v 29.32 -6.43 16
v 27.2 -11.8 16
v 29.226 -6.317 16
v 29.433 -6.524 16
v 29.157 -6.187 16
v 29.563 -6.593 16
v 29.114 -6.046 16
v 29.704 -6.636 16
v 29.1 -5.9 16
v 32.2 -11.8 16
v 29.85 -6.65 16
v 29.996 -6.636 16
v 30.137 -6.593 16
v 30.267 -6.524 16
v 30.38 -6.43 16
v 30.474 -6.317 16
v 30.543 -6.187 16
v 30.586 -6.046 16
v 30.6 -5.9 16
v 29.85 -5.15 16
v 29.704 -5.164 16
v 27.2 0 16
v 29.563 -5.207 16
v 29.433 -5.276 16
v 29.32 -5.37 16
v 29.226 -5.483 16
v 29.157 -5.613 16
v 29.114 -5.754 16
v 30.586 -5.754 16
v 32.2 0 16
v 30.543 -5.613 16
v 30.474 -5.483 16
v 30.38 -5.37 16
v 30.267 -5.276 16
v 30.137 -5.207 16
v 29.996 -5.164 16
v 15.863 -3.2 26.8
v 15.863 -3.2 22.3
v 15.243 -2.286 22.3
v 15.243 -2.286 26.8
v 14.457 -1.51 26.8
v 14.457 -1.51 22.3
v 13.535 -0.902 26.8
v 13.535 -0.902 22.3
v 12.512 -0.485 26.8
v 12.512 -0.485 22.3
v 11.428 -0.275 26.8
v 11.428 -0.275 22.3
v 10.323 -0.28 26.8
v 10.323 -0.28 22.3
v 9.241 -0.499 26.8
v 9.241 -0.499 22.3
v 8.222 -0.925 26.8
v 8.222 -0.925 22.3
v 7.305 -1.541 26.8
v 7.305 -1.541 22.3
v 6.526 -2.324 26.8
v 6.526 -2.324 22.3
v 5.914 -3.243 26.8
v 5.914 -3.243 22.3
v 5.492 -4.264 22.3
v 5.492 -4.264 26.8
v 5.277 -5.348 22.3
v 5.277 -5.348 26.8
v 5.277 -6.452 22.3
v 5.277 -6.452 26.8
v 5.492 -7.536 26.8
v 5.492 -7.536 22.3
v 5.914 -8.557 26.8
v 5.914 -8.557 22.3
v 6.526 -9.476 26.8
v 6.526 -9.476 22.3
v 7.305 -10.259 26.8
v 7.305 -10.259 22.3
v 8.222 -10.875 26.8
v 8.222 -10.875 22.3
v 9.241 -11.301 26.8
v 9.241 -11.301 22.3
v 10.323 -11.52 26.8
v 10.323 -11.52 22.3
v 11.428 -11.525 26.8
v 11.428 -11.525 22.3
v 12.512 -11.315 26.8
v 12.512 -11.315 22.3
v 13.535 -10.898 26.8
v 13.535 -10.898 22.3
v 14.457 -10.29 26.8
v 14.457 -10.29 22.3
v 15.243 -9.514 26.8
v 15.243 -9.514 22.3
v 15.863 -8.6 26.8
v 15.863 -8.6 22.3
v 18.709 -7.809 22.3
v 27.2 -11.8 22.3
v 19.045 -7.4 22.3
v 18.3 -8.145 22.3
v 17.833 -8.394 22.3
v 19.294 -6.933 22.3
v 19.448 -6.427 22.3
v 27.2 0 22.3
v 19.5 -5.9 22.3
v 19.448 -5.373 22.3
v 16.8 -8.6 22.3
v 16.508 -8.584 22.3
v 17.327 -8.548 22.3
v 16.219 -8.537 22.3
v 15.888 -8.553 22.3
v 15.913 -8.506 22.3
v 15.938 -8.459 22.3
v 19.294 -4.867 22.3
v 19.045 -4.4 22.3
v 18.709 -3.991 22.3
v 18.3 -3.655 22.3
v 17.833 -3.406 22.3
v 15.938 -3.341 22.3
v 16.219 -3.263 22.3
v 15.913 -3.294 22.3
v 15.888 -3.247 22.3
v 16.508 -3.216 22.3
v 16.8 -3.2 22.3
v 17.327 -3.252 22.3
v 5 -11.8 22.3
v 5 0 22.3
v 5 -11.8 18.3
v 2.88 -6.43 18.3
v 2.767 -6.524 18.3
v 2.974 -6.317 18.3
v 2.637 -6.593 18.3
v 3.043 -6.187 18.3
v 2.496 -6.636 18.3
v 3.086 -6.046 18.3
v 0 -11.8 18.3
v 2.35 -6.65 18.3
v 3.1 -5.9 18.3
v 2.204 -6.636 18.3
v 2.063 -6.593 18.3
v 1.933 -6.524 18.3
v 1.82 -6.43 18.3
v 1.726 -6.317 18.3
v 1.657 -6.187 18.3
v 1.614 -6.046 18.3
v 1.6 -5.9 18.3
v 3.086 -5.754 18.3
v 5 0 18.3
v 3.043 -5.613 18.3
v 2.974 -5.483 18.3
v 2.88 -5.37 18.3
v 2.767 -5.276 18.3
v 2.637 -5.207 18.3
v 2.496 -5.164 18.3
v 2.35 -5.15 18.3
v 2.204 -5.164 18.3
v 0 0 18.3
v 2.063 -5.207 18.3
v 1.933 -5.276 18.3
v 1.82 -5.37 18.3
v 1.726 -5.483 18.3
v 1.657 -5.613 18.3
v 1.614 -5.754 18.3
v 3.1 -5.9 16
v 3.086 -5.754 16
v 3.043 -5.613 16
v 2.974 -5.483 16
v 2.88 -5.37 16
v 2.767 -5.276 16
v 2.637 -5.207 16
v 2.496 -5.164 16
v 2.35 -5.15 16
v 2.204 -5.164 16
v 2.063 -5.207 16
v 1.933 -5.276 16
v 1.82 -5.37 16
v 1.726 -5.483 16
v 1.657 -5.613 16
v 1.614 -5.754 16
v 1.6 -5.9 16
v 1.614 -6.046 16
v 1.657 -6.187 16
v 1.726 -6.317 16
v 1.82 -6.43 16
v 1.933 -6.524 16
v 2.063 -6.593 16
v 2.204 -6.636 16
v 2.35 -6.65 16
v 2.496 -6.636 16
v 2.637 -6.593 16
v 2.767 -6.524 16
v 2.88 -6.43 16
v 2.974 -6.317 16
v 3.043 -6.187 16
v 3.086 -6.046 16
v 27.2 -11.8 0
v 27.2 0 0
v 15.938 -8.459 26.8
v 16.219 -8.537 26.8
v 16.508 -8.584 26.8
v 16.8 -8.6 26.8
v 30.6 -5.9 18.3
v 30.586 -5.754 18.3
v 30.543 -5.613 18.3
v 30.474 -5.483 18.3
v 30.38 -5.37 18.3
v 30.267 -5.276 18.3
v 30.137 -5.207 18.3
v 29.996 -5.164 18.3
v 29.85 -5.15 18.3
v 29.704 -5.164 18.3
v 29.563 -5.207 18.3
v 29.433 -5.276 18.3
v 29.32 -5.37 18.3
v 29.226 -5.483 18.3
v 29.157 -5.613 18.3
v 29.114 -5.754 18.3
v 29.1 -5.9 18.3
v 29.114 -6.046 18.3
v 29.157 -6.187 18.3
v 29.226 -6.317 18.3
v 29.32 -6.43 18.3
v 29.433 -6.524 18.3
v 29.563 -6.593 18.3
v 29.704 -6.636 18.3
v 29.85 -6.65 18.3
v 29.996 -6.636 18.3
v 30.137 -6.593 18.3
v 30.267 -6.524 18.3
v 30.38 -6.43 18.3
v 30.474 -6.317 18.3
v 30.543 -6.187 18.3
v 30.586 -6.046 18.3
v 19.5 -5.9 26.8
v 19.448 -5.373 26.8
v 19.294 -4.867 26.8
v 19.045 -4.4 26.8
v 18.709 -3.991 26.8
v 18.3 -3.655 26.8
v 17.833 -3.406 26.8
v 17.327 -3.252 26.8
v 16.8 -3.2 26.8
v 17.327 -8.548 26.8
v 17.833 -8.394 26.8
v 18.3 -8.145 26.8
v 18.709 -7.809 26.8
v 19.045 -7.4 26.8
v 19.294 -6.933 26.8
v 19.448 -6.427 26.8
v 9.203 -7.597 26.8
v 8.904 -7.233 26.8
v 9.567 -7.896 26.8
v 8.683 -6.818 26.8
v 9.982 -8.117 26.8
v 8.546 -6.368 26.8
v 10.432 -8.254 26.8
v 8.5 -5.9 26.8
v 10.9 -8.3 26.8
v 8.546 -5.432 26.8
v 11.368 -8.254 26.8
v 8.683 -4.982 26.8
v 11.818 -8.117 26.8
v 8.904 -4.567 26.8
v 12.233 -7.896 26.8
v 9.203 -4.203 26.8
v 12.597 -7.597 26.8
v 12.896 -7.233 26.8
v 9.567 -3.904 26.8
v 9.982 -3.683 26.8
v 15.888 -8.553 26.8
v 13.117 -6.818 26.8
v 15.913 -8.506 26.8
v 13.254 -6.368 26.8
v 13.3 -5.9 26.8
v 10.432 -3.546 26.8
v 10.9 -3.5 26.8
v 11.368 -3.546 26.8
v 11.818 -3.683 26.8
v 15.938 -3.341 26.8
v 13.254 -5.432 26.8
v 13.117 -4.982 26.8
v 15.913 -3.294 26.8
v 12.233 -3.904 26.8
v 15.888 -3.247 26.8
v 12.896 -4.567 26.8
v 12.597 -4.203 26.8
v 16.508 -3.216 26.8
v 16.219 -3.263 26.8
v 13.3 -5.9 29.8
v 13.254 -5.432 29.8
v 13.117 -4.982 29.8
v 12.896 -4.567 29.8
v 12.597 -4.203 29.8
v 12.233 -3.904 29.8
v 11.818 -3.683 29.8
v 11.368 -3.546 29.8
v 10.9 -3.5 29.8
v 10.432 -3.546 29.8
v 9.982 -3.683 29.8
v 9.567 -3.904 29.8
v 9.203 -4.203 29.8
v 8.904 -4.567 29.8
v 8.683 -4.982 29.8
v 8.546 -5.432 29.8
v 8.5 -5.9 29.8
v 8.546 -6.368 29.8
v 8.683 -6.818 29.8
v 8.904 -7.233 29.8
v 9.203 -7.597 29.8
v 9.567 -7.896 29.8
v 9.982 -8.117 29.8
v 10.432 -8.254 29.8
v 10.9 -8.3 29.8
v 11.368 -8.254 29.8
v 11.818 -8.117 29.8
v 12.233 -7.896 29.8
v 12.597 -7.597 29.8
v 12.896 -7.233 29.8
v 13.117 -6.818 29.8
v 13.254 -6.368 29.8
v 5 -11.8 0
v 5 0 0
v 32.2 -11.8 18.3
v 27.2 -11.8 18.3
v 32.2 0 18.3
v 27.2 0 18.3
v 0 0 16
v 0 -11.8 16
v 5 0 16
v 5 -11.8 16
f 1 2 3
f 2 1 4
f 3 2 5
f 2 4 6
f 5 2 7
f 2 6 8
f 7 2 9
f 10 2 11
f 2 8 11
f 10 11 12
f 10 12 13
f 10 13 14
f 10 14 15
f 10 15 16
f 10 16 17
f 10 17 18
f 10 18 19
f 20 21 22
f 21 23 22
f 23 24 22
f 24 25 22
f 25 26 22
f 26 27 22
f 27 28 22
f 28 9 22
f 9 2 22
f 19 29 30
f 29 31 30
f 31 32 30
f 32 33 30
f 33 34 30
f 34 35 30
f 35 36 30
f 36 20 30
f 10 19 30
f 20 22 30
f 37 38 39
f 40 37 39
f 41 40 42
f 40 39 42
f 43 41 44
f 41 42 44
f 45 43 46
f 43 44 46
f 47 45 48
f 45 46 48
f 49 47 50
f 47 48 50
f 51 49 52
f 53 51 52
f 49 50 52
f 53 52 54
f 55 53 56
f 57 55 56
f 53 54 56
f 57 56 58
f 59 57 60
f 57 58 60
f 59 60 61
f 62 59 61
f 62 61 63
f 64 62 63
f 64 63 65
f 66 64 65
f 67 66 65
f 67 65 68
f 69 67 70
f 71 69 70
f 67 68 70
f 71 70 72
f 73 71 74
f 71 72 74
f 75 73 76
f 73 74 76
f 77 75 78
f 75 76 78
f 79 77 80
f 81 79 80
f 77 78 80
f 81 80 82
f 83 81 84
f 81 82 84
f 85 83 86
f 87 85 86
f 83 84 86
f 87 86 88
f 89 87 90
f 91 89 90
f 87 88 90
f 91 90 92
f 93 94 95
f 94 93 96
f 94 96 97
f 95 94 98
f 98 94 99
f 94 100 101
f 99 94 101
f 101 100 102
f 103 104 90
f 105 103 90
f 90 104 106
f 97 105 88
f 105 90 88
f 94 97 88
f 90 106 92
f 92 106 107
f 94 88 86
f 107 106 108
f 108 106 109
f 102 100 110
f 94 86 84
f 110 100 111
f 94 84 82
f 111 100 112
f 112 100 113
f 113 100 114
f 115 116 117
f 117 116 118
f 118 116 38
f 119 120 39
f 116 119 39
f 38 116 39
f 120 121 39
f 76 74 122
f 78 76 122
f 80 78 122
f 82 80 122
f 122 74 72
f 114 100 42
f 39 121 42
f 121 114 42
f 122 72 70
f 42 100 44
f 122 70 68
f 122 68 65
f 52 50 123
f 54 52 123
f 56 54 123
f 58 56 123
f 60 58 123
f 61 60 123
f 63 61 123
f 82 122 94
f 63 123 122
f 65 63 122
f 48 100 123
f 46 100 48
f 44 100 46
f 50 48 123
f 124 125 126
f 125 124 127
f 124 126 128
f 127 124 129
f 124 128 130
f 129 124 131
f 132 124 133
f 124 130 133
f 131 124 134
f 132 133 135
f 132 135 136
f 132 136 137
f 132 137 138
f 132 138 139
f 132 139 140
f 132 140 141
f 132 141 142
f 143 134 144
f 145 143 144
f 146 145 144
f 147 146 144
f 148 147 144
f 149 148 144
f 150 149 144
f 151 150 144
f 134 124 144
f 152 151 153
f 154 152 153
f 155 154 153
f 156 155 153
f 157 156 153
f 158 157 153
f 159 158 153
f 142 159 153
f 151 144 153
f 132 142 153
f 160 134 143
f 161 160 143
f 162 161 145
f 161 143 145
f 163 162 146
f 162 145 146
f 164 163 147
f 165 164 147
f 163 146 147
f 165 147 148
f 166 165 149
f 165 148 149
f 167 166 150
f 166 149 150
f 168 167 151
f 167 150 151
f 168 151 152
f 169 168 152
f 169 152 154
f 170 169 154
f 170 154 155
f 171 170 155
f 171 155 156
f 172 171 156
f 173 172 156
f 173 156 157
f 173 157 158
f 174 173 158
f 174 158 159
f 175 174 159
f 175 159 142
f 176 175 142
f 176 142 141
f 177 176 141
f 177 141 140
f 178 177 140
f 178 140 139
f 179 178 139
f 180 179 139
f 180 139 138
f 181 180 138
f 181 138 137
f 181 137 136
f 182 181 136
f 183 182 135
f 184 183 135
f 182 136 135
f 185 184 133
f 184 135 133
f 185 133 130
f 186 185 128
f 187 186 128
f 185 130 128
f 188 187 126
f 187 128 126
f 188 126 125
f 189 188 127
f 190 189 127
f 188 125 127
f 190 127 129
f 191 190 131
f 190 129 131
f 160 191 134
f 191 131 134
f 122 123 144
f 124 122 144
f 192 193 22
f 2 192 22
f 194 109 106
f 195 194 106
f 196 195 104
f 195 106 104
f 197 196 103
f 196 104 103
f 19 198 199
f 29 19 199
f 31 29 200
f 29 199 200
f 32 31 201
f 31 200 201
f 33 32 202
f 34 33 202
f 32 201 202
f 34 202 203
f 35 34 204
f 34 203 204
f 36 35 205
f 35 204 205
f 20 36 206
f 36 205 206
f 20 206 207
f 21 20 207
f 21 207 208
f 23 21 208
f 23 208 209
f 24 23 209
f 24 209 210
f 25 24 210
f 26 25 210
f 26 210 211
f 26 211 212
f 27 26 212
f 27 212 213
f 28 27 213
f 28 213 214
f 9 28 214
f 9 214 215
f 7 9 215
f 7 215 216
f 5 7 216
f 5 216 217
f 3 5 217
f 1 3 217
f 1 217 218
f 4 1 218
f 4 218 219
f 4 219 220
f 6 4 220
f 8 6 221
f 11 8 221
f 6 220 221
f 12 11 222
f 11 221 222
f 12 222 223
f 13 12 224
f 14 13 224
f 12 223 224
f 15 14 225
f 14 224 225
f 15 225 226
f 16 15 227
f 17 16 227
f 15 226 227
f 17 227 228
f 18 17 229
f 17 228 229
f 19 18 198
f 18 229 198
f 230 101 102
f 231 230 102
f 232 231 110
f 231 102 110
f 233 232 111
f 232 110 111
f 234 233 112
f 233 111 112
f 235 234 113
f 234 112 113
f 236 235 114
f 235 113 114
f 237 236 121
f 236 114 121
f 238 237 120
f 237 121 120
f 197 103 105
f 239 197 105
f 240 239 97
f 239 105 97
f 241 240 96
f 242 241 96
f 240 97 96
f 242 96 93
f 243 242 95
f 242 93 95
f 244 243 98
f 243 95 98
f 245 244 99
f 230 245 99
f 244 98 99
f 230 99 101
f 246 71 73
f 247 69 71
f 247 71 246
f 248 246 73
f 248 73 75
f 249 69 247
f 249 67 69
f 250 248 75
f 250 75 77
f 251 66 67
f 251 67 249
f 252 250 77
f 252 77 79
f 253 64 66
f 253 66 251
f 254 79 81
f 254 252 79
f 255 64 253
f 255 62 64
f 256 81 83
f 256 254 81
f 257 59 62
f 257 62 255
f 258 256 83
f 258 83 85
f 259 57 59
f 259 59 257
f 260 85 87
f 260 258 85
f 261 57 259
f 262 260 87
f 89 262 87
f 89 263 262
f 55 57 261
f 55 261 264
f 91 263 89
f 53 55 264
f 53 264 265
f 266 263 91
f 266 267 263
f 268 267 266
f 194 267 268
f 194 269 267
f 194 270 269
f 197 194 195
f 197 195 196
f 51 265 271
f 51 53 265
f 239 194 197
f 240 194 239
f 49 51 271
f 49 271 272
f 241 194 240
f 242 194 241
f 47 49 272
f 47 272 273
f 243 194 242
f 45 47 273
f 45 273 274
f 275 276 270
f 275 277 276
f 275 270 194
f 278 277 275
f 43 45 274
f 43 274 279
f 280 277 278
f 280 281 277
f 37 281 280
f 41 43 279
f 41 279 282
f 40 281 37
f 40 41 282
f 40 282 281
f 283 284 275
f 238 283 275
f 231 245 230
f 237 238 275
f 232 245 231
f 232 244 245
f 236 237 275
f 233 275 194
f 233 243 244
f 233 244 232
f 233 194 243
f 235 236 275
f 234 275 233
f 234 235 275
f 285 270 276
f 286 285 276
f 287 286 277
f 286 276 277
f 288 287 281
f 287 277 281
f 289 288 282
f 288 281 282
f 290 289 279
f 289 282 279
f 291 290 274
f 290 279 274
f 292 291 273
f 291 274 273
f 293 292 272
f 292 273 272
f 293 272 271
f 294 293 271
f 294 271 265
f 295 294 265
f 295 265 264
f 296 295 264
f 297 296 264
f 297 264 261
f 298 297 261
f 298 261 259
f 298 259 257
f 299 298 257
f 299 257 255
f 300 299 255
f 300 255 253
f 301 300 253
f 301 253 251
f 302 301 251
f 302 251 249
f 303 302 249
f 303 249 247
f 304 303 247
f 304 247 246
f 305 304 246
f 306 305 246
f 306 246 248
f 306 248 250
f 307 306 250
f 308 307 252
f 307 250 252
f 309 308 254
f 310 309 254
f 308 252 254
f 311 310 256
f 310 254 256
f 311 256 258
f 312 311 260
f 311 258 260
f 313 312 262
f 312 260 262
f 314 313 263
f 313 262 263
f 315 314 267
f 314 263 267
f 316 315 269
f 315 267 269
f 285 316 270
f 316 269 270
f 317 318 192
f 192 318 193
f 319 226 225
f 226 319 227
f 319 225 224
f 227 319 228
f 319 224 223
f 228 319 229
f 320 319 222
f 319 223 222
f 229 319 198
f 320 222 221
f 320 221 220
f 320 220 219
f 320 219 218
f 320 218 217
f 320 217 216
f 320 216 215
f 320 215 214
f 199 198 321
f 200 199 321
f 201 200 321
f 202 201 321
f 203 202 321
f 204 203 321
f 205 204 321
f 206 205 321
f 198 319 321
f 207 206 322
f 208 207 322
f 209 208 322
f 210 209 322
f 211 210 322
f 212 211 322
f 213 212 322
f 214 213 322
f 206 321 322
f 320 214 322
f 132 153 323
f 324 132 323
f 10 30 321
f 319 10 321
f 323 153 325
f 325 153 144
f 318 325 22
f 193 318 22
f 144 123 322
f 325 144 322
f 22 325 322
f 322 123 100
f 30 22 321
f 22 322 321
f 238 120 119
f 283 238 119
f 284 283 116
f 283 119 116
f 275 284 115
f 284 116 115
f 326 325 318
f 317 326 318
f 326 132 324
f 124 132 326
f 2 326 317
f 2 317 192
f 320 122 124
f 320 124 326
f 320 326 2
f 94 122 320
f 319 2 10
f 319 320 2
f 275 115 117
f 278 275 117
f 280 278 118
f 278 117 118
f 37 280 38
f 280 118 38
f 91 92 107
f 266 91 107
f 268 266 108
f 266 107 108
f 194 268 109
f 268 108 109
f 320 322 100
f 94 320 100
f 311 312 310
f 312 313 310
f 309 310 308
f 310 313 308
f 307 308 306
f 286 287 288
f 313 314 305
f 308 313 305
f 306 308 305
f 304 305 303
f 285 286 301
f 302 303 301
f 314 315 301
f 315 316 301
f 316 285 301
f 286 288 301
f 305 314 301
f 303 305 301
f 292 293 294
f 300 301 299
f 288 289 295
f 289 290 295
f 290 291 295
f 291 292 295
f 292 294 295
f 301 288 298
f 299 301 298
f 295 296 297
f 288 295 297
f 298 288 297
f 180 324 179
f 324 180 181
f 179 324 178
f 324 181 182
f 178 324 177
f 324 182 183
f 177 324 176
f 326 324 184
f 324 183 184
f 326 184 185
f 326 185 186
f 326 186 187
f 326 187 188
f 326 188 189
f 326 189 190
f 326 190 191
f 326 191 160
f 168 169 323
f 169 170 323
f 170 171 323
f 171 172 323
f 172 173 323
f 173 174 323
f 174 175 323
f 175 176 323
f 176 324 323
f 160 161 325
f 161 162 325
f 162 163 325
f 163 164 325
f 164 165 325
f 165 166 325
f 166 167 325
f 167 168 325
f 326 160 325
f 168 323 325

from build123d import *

# Parameters (mm, degrees)
F1_DEPTH = 11.8
F2_R     = 2.4
F3_DEPTH = 4.5
F4_DEPTH = 7.5
F2_R_2   = 0.75
F5_DEPTH = 22.301


with BuildPart() as f1:
    # F0 (on Front) → F1 (new body)
    with BuildSketch(Plane.XZ):
        Polygon((5, 16), (5, 0), (27.2, 0), (27.2, 16), (32.2, 16), (32.2, 18.3), (27.2, 18.3), (27.2, 22.3), (5, 22.3), (5, 18.3), (0, 18.3), (0, 16), align=None)
    extrude(amount=F1_DEPTH)

    # F2 (on face) → F3 (join)
    with BuildSketch(Plane.XY.offset(22.3)):
        with BuildLine():
            ThreePointArc((16.55, -5.9), (16.3947418047, -4.5845865669), (15.9375, -3.3414664845))
            ThreePointArc((15.9375, -3.3414664845), (14.1, -5.9), (15.9375, -8.4585335155))
            ThreePointArc((15.9375, -8.4585335155), (16.3947418047, -7.2154134331), (16.55, -5.9))
        make_face()
        with BuildLine():
            ThreePointArc((15.9375, -3.3414664845), (15.9008072344, -3.2704701932), (15.8631139419, -3.2))
            ThreePointArc((15.8631139419, -3.2), (5.25, -5.9), (15.8631139419, -8.6))
            ThreePointArc((15.8631139419, -8.6), (15.9008072344, -8.5295298068), (15.9375, -8.4585335155))
            ThreePointArc((15.9375, -8.4585335155), (14.1, -5.9), (15.9375, -3.3414664845))
        make_face()
        with Locations((10.9, -5.9)):
            Circle(F2_R, mode=Mode.SUBTRACT)
        with BuildLine():
            ThreePointArc((16.8, -3.2), (16.3629876958, -3.235601335), (15.9375, -3.3414664845))
            ThreePointArc((15.9375, -3.3414664845), (16.3947418047, -4.5845865669), (16.55, -5.9))
            ThreePointArc((16.55, -5.9), (16.3947418047, -7.2154134331), (15.9375, -8.4585335155))
            ThreePointArc((15.9375, -8.4585335155), (16.3629876958, -8.564398665), (16.8, -8.6))
            ThreePointArc((16.8, -8.6), (18.7091883092, -7.8091883092), (19.5, -5.9))
            ThreePointArc((19.5, -5.9), (18.7091883092, -3.9908116908), (16.8, -3.2))
        make_face()
    extrude(amount=F3_DEPTH)

    # F4 (add): a face of the model
    f4_faces = [f1.faces().sort_by_distance(p)[0] for p in [
        (10.9, -5.9, 22.3),
    ]]
    extrude(f4_faces, amount=F4_DEPTH)

    # F2 (on face) → F5 (cut, through all)
    with BuildSketch(Plane.XY.offset(22.3)):
        with Locations((2.35, -5.9)):
            Circle(F2_R_2)
        with Locations((29.85, -5.9)):
            Circle(F2_R_2)
    extrude(amount=-F5_DEPTH, mode=Mode.SUBTRACT)


solid = f1.part
